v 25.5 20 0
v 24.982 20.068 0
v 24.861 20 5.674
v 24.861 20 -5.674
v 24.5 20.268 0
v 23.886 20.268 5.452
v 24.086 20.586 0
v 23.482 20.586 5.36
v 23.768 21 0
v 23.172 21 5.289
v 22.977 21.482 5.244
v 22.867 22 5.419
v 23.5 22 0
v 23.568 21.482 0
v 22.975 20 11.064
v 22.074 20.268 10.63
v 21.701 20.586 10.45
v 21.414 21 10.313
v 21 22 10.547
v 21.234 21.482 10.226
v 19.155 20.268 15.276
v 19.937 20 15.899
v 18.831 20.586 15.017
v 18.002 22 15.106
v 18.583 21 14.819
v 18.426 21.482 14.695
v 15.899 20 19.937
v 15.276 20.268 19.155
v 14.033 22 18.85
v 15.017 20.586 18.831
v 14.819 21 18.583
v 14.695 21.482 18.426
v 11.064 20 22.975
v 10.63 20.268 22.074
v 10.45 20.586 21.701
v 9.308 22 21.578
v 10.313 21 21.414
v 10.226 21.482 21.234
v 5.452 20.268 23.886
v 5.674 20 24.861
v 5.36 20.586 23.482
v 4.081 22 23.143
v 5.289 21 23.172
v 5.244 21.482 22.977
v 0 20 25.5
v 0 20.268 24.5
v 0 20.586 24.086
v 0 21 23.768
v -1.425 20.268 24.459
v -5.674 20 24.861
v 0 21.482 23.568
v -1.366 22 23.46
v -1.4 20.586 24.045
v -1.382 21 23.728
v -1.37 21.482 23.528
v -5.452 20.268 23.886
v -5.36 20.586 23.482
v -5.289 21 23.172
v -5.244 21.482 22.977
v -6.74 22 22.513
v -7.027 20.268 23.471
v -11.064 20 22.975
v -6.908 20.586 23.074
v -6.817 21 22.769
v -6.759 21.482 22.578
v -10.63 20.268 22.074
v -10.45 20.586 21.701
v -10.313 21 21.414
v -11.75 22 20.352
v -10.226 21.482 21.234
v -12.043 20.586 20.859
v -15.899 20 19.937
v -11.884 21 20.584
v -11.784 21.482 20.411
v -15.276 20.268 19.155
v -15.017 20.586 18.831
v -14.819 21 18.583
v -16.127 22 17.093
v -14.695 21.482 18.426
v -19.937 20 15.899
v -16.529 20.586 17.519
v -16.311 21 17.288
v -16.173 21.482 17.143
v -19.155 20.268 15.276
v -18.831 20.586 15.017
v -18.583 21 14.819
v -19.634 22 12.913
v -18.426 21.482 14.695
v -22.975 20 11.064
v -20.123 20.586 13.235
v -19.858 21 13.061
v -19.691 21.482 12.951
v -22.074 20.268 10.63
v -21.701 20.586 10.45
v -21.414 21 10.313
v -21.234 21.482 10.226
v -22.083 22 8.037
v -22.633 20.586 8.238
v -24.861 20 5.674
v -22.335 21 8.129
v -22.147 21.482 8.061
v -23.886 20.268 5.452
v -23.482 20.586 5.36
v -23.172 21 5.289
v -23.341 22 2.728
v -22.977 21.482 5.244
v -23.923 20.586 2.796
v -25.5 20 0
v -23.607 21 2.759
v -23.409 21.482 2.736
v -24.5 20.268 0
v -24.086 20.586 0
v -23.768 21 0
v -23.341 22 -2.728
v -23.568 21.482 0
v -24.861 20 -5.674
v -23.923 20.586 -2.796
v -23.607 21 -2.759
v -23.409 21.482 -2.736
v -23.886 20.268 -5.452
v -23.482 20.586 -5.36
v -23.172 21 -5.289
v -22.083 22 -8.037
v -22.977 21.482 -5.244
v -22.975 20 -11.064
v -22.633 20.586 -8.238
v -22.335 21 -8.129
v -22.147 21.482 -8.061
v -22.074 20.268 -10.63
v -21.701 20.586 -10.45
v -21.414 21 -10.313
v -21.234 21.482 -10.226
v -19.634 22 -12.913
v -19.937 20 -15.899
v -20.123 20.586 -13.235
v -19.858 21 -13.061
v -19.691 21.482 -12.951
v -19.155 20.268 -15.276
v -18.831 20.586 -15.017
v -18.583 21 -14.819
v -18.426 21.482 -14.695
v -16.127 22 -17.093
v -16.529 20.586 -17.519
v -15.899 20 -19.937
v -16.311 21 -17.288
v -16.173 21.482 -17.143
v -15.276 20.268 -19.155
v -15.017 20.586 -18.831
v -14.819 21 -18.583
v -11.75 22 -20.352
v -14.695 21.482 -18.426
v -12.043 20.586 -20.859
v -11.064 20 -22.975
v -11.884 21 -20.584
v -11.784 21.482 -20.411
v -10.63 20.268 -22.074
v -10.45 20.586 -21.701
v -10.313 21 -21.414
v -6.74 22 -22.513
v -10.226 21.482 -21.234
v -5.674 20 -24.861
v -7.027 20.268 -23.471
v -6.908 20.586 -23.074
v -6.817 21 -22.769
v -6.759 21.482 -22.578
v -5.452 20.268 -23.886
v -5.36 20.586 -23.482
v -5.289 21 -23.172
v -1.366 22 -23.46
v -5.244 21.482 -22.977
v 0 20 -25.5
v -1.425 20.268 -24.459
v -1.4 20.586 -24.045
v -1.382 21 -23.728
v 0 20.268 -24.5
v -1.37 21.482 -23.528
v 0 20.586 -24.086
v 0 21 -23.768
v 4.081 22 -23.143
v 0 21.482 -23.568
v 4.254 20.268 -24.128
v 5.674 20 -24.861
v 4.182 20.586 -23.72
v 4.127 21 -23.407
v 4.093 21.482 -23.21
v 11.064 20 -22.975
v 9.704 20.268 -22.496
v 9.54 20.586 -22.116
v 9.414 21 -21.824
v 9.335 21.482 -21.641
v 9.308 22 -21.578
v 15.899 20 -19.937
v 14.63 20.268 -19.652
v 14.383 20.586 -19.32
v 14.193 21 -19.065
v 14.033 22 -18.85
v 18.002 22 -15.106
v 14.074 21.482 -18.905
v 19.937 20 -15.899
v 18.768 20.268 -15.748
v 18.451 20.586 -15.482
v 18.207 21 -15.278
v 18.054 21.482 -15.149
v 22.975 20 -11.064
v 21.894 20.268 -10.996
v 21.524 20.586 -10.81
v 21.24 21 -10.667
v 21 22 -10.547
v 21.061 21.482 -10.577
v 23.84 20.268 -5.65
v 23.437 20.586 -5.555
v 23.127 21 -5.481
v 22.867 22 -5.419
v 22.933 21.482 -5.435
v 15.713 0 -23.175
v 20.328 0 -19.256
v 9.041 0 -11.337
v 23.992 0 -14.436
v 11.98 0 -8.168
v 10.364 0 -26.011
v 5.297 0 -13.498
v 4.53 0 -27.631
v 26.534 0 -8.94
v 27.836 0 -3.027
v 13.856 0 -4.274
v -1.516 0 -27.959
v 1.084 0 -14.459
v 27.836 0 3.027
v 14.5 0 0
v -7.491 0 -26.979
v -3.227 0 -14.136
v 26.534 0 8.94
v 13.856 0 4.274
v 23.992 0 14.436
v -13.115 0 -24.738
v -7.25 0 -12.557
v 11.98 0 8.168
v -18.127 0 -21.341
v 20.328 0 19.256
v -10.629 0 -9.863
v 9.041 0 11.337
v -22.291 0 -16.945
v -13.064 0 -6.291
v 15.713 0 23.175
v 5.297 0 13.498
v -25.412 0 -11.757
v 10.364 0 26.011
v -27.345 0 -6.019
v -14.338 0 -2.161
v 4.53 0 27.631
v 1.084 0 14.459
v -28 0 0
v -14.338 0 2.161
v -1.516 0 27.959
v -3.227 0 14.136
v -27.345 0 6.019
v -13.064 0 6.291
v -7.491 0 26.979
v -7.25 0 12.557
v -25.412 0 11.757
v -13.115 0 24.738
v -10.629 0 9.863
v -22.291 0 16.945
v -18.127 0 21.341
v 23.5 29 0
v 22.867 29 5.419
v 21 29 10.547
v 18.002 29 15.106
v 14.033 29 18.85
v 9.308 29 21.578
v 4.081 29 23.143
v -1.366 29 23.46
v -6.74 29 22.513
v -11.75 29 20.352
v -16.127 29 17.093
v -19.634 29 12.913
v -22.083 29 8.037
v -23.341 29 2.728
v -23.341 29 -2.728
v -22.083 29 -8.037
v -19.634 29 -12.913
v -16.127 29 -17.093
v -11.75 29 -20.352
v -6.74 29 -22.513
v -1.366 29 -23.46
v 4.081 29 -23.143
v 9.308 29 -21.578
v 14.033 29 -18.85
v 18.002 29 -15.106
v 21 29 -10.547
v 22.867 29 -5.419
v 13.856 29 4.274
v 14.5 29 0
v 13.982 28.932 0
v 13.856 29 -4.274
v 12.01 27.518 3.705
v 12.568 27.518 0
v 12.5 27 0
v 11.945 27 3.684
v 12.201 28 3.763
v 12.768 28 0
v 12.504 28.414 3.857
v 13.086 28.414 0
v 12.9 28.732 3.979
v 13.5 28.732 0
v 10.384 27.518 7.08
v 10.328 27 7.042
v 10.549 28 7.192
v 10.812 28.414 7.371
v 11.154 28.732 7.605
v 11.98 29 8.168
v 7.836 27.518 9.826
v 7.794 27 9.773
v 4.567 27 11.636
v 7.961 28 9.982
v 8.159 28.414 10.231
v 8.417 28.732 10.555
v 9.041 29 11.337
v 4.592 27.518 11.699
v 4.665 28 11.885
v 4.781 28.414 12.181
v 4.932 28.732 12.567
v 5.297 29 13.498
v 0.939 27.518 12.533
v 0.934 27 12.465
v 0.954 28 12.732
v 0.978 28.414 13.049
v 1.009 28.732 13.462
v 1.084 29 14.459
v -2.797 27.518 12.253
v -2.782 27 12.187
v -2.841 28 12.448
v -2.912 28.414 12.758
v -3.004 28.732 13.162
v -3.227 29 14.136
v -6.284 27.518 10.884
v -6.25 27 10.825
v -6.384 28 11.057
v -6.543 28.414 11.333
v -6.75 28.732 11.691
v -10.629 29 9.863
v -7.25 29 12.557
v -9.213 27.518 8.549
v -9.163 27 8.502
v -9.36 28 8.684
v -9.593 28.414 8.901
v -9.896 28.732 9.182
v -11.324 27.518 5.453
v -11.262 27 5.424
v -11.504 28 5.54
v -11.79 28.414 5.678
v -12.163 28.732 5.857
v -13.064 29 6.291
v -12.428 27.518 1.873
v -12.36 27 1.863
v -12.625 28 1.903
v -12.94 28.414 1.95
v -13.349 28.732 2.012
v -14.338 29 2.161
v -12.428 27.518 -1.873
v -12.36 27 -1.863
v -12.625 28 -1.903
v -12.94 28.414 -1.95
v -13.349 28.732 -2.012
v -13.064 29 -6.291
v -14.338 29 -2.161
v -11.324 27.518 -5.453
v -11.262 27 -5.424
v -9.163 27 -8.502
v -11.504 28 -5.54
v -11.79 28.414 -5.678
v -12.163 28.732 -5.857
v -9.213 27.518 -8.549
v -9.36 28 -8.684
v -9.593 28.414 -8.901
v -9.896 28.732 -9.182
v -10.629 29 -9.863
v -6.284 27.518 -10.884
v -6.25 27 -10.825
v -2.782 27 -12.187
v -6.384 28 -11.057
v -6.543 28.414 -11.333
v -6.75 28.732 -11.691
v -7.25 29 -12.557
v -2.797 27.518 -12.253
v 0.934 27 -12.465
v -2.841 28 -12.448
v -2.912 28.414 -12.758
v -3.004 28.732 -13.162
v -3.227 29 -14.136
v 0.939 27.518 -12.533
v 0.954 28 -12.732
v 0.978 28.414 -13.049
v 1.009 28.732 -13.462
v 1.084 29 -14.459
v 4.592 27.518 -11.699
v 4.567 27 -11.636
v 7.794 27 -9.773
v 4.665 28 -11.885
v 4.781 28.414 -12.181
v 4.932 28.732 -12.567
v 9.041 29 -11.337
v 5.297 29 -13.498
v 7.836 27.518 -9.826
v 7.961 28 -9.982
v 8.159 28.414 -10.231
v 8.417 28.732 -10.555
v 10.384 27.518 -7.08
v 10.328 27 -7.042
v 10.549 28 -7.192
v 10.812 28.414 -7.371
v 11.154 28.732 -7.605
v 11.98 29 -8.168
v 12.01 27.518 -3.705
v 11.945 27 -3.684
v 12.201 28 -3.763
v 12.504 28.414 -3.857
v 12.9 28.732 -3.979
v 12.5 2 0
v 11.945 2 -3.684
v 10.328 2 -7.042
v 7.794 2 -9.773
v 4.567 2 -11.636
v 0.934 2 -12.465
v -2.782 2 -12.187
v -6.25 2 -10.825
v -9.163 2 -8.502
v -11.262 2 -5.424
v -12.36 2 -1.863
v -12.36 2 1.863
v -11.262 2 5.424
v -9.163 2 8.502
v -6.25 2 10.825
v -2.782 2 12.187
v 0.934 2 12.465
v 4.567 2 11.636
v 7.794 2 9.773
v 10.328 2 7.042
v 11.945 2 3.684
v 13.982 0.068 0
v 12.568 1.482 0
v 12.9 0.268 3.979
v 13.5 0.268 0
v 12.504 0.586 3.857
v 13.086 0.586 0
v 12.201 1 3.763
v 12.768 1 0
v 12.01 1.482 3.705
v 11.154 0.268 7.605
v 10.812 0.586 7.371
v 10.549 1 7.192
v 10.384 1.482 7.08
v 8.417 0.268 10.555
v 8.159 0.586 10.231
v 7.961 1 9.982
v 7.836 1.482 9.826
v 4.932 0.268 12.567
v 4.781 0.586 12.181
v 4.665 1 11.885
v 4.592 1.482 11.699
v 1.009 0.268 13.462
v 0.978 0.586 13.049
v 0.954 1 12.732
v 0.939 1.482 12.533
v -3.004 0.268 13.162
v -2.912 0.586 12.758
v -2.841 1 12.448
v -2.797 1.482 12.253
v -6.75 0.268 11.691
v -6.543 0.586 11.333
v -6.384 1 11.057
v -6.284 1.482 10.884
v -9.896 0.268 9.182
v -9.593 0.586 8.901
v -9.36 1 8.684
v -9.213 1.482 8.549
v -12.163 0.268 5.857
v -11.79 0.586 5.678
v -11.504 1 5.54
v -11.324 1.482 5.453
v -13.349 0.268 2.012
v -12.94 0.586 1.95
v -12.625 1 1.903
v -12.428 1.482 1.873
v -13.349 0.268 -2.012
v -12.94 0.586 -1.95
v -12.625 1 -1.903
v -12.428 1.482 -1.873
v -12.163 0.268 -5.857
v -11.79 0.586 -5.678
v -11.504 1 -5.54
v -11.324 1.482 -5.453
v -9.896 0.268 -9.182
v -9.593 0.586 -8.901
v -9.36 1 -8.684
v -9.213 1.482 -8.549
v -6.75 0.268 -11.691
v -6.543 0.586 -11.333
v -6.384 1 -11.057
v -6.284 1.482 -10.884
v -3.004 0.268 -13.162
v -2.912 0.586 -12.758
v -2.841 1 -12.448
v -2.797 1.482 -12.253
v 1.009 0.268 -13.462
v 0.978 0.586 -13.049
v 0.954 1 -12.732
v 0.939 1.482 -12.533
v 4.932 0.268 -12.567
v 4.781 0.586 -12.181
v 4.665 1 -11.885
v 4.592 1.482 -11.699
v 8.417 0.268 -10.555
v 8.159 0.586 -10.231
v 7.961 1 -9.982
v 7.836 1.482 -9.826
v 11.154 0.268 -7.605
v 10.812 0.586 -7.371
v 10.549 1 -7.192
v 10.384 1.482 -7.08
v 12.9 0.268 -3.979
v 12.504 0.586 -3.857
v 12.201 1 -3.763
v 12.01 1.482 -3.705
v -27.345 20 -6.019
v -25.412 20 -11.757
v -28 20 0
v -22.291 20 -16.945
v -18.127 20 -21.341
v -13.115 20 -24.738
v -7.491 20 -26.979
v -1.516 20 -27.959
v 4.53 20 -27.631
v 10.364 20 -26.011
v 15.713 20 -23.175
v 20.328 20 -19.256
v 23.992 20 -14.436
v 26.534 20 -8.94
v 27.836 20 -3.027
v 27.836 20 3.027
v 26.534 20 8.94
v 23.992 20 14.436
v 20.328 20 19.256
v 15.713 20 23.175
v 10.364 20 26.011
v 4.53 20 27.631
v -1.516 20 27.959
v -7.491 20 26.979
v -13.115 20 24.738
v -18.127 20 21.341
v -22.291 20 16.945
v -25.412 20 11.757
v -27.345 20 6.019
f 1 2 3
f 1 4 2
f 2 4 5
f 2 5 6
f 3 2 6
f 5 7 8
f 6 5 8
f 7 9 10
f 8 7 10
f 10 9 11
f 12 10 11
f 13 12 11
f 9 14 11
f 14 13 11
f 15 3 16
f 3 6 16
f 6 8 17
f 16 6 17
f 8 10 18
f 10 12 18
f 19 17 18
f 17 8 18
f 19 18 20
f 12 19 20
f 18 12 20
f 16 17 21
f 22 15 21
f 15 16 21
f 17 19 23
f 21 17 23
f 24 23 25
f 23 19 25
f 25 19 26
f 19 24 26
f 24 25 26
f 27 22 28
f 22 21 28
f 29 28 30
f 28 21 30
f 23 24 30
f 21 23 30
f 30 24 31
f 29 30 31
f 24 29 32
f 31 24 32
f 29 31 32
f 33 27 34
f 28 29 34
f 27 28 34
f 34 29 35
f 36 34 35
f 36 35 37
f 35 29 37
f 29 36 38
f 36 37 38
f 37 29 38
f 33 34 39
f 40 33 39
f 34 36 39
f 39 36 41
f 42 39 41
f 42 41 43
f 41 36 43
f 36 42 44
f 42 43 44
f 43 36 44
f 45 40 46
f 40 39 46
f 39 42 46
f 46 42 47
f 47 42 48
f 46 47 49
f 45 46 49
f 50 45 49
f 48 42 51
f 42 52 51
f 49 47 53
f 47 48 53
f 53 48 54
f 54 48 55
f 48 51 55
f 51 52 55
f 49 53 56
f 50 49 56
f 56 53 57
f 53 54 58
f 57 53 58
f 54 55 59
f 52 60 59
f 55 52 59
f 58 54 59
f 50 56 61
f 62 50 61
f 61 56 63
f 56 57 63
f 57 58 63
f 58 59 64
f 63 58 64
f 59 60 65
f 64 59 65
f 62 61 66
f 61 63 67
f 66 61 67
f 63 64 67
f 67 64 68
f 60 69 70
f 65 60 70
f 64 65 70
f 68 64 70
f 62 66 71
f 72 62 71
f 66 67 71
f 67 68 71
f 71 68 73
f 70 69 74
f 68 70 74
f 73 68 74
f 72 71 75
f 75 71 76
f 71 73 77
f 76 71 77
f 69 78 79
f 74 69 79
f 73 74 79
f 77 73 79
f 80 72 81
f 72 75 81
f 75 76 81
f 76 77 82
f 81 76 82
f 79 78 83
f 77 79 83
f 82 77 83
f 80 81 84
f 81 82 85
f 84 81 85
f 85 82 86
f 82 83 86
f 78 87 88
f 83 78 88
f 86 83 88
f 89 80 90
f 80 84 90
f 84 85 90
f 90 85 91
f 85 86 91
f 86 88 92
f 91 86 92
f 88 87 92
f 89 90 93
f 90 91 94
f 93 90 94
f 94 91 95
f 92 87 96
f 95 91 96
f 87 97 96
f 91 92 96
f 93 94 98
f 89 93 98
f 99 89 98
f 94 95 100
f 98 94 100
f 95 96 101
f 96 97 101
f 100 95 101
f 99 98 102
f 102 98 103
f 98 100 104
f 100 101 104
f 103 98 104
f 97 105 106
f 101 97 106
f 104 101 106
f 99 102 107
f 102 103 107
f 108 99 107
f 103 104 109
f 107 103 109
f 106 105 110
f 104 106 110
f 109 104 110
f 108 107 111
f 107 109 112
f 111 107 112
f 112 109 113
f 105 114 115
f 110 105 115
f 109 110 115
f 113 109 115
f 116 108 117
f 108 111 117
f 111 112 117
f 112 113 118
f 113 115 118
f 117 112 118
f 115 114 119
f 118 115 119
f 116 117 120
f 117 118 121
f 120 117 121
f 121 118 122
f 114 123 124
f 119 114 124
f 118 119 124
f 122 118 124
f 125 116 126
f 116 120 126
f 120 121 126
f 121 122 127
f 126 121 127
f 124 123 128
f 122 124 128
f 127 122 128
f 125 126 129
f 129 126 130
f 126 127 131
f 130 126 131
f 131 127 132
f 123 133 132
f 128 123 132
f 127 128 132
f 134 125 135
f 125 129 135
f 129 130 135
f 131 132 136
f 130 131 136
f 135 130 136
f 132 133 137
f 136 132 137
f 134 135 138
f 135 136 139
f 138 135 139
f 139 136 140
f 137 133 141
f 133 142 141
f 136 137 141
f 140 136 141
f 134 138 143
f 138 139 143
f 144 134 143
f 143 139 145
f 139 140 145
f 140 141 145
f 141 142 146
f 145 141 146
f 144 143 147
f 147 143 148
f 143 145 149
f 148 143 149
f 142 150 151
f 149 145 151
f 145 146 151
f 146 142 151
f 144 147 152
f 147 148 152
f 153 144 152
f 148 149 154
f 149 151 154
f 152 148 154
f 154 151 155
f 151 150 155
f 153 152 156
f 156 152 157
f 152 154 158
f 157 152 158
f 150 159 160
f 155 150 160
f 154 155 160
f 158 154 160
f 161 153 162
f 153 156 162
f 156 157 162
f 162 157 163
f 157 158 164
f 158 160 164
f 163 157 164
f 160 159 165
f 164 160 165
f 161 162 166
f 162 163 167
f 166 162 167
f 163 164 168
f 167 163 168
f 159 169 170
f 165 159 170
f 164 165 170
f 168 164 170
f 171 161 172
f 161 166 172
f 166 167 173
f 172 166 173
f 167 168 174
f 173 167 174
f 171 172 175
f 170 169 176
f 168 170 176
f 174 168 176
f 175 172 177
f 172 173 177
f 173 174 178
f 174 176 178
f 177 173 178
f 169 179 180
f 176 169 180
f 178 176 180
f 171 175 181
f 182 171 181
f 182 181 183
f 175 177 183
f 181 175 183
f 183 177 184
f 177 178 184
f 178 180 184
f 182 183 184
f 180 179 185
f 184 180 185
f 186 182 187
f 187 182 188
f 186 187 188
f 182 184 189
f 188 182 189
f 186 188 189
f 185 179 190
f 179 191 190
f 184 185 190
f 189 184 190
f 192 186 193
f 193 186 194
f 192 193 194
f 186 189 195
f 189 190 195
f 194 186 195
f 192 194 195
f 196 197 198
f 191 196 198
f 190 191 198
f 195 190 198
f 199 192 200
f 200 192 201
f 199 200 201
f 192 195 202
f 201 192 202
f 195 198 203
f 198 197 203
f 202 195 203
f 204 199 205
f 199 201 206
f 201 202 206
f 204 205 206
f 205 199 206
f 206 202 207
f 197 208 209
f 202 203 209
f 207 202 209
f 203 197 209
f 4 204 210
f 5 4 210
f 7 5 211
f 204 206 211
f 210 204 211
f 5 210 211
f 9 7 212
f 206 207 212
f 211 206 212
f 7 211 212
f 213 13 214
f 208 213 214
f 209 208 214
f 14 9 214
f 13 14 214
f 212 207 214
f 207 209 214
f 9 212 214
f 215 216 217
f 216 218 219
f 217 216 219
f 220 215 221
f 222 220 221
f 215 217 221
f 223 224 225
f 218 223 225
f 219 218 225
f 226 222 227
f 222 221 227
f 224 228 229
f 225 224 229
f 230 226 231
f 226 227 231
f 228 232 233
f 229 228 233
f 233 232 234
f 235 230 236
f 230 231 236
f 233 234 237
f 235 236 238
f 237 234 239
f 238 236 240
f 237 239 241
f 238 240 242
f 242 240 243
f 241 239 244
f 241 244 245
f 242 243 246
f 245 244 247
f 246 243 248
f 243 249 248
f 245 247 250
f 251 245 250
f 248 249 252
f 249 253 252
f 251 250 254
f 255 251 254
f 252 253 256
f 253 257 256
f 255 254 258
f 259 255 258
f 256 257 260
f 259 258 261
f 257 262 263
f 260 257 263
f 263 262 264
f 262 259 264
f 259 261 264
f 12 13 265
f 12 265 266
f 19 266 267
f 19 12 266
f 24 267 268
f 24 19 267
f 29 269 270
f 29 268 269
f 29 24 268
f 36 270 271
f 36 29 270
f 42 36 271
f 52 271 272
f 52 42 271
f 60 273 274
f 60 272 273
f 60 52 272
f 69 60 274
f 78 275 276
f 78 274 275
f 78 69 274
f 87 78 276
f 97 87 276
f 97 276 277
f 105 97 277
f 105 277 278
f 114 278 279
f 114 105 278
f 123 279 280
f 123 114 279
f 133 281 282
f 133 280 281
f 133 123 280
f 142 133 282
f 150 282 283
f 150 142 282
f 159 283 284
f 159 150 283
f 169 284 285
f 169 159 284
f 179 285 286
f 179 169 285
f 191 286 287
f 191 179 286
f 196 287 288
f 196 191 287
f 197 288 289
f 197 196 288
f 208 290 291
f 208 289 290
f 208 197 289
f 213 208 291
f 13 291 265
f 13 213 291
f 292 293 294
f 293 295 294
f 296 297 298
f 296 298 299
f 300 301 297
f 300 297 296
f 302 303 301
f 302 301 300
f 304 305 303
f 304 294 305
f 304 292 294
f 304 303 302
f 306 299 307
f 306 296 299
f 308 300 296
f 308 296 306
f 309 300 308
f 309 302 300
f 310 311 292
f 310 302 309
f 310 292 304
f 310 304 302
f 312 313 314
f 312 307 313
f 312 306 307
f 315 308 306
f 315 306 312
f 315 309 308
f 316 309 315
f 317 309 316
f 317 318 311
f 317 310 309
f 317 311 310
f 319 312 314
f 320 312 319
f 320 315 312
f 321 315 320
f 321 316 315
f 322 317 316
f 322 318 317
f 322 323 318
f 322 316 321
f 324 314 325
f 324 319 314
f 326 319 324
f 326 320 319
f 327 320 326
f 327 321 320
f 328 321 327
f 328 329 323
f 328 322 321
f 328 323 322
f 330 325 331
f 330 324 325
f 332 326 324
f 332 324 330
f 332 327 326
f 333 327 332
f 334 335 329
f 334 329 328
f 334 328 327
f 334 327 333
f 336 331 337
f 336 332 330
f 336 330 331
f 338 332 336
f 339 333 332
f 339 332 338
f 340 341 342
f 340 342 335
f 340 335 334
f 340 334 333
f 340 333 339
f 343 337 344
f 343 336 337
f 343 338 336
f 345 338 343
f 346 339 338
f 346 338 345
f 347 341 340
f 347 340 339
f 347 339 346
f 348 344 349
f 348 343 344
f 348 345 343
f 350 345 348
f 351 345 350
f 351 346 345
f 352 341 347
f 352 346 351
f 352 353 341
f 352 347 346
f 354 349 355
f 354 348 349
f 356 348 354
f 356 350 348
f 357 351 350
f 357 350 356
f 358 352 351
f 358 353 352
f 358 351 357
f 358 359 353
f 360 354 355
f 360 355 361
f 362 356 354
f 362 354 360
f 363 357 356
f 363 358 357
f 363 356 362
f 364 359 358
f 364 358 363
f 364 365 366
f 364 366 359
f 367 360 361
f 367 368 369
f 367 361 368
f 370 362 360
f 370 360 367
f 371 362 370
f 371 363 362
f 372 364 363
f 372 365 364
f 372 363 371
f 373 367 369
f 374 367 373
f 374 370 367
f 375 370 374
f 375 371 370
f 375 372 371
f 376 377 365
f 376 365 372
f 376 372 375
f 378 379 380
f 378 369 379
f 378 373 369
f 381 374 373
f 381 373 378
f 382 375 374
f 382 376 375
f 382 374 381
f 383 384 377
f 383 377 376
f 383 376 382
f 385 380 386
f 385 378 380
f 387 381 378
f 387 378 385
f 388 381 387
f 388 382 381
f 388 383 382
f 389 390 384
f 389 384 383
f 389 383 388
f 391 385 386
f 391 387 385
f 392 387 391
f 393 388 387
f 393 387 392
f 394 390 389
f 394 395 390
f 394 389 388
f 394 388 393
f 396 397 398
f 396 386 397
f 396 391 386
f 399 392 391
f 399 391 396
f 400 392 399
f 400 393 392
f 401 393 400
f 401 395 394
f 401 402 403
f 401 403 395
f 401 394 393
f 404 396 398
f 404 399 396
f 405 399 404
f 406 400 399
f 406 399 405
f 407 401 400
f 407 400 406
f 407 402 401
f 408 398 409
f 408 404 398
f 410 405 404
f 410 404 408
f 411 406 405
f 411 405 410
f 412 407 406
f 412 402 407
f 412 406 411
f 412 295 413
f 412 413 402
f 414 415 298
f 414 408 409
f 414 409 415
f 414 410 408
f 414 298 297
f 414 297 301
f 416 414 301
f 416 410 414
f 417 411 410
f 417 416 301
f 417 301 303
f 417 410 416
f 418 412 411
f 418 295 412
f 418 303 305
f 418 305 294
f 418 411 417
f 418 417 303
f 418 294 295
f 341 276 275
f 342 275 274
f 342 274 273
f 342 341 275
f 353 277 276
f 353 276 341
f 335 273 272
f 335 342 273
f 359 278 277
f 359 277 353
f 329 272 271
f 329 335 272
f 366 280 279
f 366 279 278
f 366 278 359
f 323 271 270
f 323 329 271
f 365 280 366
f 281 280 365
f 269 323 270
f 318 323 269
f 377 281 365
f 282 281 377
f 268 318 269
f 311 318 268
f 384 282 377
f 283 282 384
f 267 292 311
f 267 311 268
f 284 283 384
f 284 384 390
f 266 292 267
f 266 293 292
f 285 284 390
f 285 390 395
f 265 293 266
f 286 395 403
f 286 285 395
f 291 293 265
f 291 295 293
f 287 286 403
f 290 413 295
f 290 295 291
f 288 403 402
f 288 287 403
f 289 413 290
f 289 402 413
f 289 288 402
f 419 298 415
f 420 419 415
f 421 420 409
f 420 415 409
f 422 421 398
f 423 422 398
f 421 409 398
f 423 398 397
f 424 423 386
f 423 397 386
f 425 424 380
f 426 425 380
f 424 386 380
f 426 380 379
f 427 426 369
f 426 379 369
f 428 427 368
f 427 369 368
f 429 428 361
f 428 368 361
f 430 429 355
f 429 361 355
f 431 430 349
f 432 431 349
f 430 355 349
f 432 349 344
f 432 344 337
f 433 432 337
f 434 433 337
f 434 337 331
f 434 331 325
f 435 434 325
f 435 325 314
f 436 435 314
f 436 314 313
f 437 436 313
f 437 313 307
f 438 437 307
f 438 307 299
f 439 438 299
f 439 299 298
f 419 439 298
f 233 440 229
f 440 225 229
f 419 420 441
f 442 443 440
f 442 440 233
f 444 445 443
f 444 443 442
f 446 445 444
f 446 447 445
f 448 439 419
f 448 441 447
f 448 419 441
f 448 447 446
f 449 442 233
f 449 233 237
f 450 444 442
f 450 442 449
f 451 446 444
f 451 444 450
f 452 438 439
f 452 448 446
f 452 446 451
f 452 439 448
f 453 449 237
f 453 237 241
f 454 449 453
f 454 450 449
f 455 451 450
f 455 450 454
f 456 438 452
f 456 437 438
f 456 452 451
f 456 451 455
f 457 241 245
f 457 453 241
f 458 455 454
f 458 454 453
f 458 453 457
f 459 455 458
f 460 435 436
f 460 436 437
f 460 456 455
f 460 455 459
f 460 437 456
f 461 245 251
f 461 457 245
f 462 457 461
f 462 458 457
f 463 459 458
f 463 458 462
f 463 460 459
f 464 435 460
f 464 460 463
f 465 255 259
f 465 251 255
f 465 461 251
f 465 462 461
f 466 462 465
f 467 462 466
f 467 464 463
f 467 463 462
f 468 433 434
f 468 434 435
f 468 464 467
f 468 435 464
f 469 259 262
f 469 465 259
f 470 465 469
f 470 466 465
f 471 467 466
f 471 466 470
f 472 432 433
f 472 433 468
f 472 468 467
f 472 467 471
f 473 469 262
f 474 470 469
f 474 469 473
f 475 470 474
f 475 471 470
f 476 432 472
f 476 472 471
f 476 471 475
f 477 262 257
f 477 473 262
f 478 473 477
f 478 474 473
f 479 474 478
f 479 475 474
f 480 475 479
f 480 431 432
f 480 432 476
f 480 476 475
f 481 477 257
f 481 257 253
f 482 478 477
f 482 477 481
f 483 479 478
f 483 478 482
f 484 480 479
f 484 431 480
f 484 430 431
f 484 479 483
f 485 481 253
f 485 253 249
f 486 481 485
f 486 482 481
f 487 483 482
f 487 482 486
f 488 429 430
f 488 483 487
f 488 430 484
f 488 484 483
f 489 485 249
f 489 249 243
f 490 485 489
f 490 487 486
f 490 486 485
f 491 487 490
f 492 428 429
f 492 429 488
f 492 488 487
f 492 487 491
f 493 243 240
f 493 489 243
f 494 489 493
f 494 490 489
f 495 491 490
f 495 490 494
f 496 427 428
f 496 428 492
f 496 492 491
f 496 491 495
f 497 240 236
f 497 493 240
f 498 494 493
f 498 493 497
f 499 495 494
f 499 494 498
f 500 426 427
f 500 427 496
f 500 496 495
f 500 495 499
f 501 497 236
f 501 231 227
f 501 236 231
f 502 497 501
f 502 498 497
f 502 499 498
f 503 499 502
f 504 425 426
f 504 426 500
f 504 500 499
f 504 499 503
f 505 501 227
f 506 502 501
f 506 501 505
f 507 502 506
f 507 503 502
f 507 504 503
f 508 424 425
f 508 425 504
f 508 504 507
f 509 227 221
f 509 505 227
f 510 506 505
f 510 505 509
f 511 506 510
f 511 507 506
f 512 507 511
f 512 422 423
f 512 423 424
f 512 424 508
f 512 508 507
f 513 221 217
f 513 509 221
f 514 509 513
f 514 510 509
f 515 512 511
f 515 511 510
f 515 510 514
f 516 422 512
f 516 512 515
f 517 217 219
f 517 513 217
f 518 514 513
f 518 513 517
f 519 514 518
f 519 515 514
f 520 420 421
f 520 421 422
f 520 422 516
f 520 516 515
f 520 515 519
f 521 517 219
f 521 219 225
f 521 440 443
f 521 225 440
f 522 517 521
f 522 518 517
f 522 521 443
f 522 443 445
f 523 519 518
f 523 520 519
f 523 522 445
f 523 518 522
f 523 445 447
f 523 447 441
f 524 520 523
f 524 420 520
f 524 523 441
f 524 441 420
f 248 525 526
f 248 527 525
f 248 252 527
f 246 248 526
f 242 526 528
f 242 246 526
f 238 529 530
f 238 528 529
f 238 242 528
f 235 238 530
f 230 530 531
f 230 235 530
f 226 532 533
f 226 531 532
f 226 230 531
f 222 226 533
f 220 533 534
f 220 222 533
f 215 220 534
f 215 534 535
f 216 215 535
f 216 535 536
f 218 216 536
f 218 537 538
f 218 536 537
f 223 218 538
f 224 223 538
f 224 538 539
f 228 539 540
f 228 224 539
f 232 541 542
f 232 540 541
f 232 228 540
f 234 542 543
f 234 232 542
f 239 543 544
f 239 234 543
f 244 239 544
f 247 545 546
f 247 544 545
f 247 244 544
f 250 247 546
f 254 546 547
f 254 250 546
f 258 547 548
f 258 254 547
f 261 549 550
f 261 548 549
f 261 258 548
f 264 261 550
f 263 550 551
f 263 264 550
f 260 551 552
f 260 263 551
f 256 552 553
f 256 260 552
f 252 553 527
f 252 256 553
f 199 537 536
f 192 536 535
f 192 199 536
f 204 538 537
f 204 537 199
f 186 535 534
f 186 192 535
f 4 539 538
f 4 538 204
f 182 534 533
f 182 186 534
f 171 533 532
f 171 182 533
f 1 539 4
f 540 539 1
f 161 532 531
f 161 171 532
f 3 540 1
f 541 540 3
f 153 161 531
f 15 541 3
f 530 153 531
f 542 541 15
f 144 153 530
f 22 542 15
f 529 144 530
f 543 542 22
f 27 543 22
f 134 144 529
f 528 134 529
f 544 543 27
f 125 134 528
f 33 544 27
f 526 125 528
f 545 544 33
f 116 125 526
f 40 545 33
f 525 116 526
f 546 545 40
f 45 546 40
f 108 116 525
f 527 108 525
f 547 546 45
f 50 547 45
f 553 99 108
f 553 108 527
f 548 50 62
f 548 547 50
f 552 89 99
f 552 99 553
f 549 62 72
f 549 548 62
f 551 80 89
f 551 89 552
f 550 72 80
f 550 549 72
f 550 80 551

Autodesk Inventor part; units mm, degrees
ref_plane "YZ Plane" through (0, 0, 0) normal (1, 0, 0) x (0, 1, 0)
ref_plane "XZ Plane" through (0, 0, 0) normal (0, 1, 0) x (-1, 0, 0)
ref_plane "XY Plane" through (0, 0, 0) normal (0, 0, 1) x (1, 0, 0)
sketch "Sketch1" plane through (0, 0, 0) normal (0, 1, 0) x (-1, 0, 0)
  circle A0 centre (0, 0) radius 28
  dimension "d0" = 56
extrude "Extrusion1" add sketch "Sketch1" along normal blind 20
sketch "Sketch2" plane through (0, 20, 0) normal (0, 1, 0) x (1, 0, 0)
  circle A0 centre (0, 0) radius 23.5
  dimension "d3" = 47
extrude "Extrusion2" add sketch "Sketch2" along normal blind 9
sketch "Sketch3" plane through (0, 29, 0) normal (0, 1, 0) x (1, 0, 0)
  circle A0 centre (0, 0) radius 12.5
  dimension "d6" = 25
extrude "Extrusion3" cut sketch "Sketch3" against normal blind 38
fillet "Fillet1" radius 2 2 edges at (-12.5, 29, 0) (-12.5, 0, 0)
fillet "Fillet2" radius 2 1 edges at (-23.5, 20, 0)
properties part number "PISTON GUIDE"
